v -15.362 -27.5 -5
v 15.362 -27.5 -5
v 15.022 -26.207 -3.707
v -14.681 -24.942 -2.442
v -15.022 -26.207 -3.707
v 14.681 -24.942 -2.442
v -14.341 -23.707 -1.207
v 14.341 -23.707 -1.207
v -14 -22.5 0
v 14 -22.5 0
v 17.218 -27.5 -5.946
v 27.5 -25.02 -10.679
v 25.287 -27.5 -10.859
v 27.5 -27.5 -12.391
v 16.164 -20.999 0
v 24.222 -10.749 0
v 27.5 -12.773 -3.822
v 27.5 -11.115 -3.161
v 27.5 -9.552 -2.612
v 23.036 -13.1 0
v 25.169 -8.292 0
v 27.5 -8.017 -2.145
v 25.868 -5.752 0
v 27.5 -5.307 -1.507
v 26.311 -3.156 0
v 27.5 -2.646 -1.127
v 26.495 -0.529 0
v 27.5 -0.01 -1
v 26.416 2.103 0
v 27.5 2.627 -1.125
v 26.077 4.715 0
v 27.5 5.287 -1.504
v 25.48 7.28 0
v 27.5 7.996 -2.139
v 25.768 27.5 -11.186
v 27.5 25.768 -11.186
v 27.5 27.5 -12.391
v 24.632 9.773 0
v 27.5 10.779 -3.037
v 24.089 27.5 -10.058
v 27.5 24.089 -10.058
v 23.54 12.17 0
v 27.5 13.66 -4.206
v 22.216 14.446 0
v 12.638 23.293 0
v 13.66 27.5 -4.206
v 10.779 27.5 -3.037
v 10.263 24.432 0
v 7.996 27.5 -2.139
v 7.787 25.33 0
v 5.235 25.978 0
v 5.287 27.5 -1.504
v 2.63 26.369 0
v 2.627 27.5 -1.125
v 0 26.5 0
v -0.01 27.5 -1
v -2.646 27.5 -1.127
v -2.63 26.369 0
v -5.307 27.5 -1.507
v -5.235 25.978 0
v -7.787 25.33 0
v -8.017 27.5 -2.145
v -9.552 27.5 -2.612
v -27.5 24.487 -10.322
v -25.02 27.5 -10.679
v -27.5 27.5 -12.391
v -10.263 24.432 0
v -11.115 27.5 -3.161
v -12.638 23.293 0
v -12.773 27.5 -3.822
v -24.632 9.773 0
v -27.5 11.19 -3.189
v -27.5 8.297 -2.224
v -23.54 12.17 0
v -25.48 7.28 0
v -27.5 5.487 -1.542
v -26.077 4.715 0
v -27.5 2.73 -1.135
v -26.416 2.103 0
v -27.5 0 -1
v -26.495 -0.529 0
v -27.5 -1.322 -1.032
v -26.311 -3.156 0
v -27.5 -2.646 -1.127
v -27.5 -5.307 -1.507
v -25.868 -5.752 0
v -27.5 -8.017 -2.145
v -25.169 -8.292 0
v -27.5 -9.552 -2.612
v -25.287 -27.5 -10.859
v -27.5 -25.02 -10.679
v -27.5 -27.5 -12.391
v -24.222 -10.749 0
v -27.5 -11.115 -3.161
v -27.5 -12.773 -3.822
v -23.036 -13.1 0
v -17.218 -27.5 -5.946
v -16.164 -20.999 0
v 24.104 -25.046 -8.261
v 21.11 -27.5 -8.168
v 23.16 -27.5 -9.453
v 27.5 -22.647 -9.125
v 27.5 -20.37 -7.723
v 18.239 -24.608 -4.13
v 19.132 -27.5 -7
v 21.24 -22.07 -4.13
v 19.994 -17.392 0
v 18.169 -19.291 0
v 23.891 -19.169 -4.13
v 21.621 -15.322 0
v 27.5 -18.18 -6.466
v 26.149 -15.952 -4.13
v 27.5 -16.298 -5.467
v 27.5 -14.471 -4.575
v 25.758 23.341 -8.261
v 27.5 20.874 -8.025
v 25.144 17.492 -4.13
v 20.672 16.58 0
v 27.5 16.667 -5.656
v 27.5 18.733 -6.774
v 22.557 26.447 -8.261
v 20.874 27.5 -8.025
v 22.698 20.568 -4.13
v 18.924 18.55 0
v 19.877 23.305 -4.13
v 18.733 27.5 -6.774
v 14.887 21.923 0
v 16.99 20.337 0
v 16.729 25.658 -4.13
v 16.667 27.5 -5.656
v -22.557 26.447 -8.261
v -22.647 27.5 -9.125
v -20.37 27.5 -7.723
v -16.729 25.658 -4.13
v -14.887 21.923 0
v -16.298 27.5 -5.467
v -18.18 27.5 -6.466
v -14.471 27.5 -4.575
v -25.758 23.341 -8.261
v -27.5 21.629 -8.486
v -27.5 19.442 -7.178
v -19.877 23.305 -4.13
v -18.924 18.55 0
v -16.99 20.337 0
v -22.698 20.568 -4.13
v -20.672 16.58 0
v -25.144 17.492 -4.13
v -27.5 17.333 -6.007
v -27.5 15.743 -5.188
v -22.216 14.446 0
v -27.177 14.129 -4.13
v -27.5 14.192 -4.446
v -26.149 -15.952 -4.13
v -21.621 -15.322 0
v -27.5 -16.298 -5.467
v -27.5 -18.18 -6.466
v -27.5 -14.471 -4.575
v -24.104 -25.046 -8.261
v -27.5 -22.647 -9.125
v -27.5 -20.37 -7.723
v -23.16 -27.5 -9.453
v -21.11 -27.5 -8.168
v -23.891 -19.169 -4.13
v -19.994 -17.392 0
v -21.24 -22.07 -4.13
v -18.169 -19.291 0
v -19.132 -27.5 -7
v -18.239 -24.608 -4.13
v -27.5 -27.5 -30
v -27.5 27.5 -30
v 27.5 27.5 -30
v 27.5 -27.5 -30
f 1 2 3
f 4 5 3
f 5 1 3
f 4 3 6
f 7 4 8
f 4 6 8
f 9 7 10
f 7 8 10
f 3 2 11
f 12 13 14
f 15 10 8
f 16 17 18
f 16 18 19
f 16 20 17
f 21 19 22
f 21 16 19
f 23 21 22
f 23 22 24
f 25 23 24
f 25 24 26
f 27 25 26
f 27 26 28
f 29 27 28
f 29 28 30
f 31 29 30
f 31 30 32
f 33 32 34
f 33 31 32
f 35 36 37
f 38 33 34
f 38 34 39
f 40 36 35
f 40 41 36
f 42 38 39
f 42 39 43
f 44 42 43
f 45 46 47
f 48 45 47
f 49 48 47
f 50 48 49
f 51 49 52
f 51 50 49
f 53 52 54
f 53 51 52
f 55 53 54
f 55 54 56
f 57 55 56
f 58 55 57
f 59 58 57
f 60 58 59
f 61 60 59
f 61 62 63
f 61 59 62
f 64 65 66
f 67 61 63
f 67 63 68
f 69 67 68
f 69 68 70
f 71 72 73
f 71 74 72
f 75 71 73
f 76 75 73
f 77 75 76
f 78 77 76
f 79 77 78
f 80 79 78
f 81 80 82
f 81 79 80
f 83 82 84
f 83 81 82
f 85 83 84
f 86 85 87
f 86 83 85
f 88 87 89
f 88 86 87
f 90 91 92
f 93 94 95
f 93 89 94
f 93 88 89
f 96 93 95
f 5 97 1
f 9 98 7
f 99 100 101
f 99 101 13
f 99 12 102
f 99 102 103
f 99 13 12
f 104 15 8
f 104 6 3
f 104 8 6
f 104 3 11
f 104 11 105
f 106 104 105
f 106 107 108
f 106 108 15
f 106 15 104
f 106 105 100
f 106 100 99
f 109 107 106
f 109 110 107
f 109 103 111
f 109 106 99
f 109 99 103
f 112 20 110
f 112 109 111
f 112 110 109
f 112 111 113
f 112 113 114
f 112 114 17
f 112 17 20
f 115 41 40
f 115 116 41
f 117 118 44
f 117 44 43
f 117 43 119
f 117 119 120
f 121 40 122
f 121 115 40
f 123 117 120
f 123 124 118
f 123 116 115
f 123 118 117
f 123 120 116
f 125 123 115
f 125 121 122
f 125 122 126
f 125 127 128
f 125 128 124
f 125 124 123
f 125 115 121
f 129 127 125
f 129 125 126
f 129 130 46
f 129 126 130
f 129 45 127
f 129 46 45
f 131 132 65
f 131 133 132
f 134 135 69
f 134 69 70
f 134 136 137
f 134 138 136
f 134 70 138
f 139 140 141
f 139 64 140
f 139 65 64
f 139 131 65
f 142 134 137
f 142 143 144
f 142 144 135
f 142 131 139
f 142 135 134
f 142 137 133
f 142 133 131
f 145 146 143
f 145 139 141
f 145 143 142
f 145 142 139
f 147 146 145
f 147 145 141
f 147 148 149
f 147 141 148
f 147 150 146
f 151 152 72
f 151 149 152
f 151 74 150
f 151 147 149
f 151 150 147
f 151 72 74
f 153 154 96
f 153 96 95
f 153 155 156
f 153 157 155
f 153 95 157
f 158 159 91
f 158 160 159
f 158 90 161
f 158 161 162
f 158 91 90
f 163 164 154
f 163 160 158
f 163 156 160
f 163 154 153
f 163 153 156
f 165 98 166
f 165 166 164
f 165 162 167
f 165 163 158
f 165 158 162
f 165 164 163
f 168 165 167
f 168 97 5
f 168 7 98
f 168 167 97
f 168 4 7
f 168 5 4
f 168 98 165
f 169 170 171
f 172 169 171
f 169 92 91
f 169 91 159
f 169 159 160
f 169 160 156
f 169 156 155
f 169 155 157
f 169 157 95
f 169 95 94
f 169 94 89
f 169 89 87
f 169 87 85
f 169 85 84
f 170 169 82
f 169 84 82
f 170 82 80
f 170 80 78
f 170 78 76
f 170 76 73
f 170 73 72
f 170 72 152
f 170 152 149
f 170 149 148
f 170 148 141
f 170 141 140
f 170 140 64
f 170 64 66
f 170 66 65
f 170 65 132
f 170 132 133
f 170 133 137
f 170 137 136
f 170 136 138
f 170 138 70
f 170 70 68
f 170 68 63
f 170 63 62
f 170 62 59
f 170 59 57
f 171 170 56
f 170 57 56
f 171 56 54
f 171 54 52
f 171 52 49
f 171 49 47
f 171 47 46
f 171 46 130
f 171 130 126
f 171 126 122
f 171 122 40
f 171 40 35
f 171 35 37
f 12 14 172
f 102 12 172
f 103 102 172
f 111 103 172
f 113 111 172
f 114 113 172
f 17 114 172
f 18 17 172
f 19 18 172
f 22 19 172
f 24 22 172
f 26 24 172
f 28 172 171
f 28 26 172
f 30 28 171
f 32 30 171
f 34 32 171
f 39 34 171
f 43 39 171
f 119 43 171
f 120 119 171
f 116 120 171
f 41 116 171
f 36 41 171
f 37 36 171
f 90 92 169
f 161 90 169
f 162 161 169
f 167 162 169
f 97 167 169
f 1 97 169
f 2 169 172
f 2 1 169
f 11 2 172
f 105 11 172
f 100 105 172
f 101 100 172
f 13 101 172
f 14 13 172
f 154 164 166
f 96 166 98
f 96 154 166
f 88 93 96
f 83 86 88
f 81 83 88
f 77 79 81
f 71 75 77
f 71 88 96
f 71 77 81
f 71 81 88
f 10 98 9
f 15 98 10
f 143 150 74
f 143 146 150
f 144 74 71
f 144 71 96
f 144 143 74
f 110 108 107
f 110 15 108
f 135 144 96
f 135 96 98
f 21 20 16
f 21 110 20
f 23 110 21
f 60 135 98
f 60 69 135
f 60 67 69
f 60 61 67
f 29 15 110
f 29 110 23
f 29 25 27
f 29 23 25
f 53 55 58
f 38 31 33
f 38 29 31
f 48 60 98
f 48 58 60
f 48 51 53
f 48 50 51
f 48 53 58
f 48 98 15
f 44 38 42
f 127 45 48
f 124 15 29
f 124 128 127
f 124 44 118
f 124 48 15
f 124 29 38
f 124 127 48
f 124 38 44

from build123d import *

# Parameters (mm, degrees)
CROQUIS1_W              = 55
CROQUIS1_H              = 55
SALIENTE_EXTRUIR1_DEPTH = 30
CORTAR_EXTRUIR1_REACH   = 70.42


with BuildPart() as part:
    # Croquis1 → Saliente-Extruir1 (new body)
    with BuildSketch(Plane.XY):
        Rectangle(CROQUIS1_W, CROQUIS1_H)
    extrude(amount=-SALIENTE_EXTRUIR1_DEPTH)

    # Croquis2 → Cortar-Revolución1 (revolve, cut)
    with BuildSketch(Plane(origin=(0, 0, 0), x_dir=(0, 0, -1), z_dir=(1, 0, 0)), mode=Mode.PRIVATE) as cortar_revoluci_n1_sk:
        Polygon((0, 26.5), (0, 46.5), (20, 46.5), align=None)
    revolve(cortar_revoluci_n1_sk.sketch.rotate(Axis((0, 0, 0), (0, 0, 1)), 90), axis=Axis((0, 0, 0), (0, 0, 1)), mode=Mode.SUBTRACT)

    # Croquis3 → Cortar-Extruir1 (cut, up to next)
    with BuildSketch(Plane(origin=(27.5, 0, 0), x_dir=(0, 0, -1), z_dir=(1, 0, 0)), mode=Mode.PRIVATE) as cortar_extruir1_sk1:
        Polygon((0, -22.5), (0, -27.5), (5, -27.5), align=None)
    cortar_extruir1_tool1 = extrude(cortar_extruir1_sk1.sketch, amount=-CORTAR_EXTRUIR1_REACH, mode=Mode.PRIVATE) & part.part
    add(cortar_extruir1_tool1.solids().sort_by_distance((27.5, -25.833333, -1.666667))[0], mode=Mode.SUBTRACT)


solid = part.part
